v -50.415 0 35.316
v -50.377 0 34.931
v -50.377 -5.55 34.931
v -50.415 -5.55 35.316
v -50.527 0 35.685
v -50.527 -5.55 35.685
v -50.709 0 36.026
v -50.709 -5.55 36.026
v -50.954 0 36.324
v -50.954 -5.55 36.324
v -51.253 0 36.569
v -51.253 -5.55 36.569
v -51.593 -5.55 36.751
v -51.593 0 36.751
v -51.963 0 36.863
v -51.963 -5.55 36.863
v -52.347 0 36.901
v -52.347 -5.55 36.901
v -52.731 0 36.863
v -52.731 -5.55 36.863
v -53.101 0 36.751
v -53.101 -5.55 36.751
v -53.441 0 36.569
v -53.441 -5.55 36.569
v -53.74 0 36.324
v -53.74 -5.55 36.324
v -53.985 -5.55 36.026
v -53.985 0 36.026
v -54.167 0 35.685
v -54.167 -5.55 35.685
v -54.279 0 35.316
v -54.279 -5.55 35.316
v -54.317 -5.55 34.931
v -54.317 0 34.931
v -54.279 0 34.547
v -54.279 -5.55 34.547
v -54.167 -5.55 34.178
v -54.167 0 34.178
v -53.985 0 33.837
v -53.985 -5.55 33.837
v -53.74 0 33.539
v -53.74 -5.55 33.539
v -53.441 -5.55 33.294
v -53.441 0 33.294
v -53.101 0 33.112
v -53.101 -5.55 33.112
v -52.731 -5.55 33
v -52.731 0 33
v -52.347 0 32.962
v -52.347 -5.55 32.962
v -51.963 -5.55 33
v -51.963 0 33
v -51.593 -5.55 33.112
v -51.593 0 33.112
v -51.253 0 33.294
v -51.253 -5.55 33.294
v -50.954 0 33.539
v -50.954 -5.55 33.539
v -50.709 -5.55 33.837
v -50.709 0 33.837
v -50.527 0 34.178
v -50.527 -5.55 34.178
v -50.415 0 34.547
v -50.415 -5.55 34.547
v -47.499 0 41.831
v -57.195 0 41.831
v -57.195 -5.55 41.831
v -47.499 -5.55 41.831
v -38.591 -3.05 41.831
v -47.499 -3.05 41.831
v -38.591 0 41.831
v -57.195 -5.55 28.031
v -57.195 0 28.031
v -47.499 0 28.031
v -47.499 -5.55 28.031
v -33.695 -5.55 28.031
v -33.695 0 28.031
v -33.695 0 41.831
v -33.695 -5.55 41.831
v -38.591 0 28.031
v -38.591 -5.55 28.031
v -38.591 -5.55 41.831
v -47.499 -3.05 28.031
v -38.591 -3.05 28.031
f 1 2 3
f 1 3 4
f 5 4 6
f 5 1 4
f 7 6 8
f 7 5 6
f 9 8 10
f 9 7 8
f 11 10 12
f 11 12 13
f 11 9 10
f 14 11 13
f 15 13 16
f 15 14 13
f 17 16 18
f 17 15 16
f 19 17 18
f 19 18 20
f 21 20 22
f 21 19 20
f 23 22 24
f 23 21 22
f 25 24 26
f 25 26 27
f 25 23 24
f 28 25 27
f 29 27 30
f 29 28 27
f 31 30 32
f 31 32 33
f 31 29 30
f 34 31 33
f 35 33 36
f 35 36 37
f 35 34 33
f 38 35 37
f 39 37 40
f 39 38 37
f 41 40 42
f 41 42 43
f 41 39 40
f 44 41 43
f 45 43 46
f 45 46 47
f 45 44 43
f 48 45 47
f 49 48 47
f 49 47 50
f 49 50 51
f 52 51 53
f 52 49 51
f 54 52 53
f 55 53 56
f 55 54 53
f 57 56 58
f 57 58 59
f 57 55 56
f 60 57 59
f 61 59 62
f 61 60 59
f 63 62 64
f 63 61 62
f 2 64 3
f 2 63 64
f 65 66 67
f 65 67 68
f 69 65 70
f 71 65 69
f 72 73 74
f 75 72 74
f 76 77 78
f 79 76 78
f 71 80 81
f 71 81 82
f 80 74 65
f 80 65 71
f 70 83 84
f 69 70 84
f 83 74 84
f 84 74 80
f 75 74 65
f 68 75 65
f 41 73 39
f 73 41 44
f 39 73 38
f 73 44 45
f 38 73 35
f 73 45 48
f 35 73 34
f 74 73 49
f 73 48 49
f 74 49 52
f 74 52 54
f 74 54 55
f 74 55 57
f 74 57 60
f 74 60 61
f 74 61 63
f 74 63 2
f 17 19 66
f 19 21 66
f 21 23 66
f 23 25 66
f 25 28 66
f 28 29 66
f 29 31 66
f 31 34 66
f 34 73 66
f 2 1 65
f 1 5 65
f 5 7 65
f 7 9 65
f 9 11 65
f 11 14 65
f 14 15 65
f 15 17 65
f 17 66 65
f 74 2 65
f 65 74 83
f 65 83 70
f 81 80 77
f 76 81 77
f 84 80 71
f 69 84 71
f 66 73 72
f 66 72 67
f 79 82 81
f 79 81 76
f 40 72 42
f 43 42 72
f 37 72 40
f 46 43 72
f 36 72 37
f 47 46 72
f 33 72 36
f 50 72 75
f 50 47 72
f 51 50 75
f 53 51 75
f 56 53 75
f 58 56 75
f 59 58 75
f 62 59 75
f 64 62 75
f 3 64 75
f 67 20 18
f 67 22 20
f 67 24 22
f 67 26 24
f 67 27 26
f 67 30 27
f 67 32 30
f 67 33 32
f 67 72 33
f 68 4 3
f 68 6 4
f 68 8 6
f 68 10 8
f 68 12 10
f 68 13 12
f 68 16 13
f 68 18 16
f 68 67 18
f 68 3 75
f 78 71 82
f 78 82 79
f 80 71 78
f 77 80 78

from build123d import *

# Parameters (mm, degrees)
F0_W     = 9.695845
F0_H     = 13.8
F0_R     = 1.969641
F0_W_2   = 4.895809
F1_DEPTH = 5.55
F0_W_3   = 8.908346
F2_DEPTH = 3.05


with BuildPart() as f1:
    # F0 (on Front) → F1 (new body)
    with BuildSketch(Plane.XZ):
        with Locations((-52.347016, 34.931377)):
            Rectangle(F0_W, F0_H)
        with Locations((-52.347017, 34.931377)):
            Circle(F0_R, mode=Mode.SUBTRACT)
        with Locations((-36.142843, 34.931377)):
            Rectangle(F0_W_2, F0_H)
    extrude(amount=F1_DEPTH)


with BuildPart() as f2:
    # F0 (on Front) → F2 (new body)
    with BuildSketch(Plane.XZ):
        with Locations((-43.044921, 34.931377)):
            Rectangle(F0_W_3, F0_H)
    extrude(amount=F2_DEPTH)


solid = Compound([f1.part, f2.part])
